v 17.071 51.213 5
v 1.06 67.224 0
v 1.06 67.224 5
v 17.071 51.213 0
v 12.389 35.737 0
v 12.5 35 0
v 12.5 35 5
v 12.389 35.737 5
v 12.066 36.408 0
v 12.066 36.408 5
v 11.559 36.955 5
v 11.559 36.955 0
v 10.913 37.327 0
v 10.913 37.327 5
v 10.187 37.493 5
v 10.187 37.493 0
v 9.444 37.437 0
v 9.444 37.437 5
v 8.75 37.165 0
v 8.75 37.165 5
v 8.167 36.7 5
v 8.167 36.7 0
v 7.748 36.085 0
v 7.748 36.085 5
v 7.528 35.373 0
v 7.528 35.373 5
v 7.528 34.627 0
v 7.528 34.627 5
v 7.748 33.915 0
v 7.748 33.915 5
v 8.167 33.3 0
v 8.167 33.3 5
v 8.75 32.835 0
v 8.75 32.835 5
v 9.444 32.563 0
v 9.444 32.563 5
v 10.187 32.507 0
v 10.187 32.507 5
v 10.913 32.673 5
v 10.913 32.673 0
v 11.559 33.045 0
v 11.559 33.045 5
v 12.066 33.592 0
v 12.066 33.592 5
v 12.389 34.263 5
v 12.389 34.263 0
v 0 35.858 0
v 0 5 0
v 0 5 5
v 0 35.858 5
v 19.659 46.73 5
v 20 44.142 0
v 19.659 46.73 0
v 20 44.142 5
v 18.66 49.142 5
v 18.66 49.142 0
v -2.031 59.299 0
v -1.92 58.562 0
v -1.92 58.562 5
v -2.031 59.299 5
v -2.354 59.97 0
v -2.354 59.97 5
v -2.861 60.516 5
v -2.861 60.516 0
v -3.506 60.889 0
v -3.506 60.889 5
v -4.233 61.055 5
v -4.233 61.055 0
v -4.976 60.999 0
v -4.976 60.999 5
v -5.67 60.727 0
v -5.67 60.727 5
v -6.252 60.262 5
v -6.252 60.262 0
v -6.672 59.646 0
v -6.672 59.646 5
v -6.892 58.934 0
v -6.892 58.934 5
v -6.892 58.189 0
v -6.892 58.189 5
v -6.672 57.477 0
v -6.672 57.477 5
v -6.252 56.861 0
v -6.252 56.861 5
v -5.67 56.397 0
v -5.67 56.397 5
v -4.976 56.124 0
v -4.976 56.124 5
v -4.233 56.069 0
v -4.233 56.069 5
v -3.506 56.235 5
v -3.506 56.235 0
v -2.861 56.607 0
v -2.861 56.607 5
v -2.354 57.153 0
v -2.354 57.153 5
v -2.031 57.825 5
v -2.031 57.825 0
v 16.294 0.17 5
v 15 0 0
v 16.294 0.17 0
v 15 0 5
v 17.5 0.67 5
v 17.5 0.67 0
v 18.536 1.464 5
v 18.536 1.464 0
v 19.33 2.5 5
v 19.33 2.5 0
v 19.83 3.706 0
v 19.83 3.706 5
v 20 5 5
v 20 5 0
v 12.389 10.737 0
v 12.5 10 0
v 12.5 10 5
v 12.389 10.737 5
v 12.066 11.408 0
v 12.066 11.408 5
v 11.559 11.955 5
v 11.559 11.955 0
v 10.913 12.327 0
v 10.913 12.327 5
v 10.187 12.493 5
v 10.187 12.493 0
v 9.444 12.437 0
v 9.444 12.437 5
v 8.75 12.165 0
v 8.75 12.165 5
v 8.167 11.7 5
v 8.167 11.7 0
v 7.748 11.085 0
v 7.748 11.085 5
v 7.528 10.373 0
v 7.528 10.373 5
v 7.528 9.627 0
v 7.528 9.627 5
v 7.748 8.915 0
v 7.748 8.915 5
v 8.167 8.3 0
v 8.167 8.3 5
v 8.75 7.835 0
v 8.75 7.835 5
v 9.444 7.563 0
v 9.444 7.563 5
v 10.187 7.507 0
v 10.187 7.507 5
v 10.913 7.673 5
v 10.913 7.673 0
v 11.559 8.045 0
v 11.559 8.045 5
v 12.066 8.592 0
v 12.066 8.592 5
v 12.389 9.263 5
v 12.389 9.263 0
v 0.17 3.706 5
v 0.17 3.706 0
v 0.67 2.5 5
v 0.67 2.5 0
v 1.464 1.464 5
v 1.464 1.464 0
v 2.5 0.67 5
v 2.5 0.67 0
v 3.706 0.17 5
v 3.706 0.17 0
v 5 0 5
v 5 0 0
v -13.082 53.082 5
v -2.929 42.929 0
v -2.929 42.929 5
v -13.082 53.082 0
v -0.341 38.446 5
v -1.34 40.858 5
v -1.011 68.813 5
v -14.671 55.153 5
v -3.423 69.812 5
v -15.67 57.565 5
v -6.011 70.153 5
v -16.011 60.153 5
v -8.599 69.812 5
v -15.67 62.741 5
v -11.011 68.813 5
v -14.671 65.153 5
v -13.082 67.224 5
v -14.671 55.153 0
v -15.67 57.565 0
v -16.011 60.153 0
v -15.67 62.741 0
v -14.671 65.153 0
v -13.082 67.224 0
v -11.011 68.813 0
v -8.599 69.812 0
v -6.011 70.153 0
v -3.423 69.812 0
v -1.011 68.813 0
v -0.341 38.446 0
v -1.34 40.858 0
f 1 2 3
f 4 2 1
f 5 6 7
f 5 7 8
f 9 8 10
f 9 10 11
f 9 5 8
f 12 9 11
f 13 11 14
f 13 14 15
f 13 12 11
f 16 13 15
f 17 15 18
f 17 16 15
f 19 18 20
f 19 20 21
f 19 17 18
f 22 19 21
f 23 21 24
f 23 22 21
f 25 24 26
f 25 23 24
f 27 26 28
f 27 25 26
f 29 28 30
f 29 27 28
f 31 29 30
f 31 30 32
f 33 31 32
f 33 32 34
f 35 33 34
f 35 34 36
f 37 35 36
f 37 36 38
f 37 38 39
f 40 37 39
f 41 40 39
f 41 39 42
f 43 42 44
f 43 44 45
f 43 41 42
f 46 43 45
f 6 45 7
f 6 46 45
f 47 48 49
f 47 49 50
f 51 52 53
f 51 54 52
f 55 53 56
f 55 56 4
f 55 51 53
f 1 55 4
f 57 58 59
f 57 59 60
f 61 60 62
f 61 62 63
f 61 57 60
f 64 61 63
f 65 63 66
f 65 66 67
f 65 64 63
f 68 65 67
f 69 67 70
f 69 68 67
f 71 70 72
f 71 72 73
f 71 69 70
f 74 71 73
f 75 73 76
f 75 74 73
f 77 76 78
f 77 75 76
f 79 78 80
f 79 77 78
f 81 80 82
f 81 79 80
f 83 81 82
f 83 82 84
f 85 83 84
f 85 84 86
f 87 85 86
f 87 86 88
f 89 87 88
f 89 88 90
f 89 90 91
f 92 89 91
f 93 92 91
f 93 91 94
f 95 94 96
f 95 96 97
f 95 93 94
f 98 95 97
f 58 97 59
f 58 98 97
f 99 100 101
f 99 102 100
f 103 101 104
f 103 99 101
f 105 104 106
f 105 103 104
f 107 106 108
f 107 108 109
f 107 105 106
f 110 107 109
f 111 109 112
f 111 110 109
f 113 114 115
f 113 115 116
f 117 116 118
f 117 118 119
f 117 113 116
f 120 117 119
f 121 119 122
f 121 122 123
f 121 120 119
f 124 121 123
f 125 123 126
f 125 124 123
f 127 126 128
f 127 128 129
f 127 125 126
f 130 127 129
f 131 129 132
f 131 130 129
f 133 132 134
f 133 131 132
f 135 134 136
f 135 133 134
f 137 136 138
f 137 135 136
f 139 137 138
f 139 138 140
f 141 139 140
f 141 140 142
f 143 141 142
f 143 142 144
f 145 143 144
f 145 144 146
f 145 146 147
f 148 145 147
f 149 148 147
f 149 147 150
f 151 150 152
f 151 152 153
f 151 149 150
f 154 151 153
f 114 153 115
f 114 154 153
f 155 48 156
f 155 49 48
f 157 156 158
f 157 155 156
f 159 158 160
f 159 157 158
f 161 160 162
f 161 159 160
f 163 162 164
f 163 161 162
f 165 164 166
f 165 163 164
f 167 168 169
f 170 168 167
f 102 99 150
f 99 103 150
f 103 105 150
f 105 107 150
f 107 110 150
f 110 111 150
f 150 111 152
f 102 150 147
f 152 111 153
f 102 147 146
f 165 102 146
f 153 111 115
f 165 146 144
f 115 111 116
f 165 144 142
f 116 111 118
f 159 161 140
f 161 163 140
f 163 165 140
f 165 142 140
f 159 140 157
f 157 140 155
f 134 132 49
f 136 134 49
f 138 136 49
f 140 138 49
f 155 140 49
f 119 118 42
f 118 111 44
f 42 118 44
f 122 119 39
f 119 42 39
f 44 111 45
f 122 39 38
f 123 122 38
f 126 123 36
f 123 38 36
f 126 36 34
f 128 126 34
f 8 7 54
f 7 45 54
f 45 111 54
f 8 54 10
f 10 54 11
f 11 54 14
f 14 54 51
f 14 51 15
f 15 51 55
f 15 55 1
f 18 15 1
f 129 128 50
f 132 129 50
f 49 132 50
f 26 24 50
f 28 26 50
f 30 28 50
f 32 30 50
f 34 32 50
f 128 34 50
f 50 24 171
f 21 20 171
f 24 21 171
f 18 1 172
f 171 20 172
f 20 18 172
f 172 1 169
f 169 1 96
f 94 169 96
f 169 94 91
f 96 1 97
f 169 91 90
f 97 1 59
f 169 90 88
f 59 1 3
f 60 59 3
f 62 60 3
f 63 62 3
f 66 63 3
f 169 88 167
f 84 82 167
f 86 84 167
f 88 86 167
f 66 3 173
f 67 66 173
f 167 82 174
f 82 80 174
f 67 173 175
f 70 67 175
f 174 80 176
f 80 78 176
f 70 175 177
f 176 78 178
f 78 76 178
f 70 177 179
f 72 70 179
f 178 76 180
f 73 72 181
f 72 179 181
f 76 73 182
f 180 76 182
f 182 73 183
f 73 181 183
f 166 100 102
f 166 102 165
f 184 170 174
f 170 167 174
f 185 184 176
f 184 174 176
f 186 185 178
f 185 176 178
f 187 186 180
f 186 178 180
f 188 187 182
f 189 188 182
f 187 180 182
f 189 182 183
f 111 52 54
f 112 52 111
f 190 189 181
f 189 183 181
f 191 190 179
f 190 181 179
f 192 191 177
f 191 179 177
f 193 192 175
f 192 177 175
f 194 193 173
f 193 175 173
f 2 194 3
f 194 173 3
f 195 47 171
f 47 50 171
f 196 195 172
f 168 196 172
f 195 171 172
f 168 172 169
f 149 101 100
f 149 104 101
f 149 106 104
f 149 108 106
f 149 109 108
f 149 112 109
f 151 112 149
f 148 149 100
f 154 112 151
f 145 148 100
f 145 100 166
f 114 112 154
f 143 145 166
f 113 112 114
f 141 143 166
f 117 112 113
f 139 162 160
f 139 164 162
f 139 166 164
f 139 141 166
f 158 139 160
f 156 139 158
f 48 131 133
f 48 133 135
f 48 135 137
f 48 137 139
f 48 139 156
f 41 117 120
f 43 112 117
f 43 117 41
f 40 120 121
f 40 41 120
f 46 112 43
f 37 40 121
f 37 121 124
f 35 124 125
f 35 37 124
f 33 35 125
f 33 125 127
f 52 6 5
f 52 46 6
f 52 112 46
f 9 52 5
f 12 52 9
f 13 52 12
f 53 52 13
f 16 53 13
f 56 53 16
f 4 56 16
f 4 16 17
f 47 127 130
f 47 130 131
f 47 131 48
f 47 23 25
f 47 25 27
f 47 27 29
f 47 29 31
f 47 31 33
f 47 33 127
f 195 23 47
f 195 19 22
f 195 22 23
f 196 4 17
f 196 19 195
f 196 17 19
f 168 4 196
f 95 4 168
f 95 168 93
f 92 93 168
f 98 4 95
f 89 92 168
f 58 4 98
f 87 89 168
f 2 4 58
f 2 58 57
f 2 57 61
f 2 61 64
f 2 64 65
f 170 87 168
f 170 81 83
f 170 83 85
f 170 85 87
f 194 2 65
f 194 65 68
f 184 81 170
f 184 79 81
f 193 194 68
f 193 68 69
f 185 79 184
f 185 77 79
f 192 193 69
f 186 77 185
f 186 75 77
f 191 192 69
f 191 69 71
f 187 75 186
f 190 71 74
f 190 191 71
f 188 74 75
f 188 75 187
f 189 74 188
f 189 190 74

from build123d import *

# Parameters (mm, degrees)
SKETCH1_R           = 2.5
BOSS_EXTRUDE1_DEPTH = 5
FILLET1_R           = 10
FILLET2_R           = 5


with BuildPart() as part:
    # Sketch1 → Boss-Extrude1 (new body)
    with BuildSketch(Plane.XY):
        Polygon((0, 0), (0, 40), (-20.152940401, 60.152940401), (-6.010804777, 74.295076025), (20, 48.284271247), (20, 0), align=None)
        with Locations((10, 10)):
            Circle(SKETCH1_R, mode=Mode.SUBTRACT)
        with Locations((10, 35)):
            Circle(SKETCH1_R, mode=Mode.SUBTRACT)
        with Locations((-4.419570665, 58.561706289)):
            Circle(SKETCH1_R, mode=Mode.SUBTRACT)
    extrude(amount=BOSS_EXTRUDE1_DEPTH)

    # Fillet1
    fillet1_edges = [part.edges().sort_by_distance(p)[0] for p in [
        (20, 48.284271247, 2.5),
        (0, 40, 2.5),
        (-20.152940401, 60.152940401, 2.5),
        (-6.010804777, 74.295076025, 2.5),
    ]]
    fillet(fillet1_edges, radius=FILLET1_R - 0.0001)  # a hair under: the kernel refuses the full size

    # Fillet2
    fillet2_edges = [part.edges().sort_by_distance(p)[0] for p in [
        (0, 0, 2.5),
        (20, 0, 2.5),
    ]]
    fillet(fillet2_edges, radius=FILLET2_R)


solid = part.part
